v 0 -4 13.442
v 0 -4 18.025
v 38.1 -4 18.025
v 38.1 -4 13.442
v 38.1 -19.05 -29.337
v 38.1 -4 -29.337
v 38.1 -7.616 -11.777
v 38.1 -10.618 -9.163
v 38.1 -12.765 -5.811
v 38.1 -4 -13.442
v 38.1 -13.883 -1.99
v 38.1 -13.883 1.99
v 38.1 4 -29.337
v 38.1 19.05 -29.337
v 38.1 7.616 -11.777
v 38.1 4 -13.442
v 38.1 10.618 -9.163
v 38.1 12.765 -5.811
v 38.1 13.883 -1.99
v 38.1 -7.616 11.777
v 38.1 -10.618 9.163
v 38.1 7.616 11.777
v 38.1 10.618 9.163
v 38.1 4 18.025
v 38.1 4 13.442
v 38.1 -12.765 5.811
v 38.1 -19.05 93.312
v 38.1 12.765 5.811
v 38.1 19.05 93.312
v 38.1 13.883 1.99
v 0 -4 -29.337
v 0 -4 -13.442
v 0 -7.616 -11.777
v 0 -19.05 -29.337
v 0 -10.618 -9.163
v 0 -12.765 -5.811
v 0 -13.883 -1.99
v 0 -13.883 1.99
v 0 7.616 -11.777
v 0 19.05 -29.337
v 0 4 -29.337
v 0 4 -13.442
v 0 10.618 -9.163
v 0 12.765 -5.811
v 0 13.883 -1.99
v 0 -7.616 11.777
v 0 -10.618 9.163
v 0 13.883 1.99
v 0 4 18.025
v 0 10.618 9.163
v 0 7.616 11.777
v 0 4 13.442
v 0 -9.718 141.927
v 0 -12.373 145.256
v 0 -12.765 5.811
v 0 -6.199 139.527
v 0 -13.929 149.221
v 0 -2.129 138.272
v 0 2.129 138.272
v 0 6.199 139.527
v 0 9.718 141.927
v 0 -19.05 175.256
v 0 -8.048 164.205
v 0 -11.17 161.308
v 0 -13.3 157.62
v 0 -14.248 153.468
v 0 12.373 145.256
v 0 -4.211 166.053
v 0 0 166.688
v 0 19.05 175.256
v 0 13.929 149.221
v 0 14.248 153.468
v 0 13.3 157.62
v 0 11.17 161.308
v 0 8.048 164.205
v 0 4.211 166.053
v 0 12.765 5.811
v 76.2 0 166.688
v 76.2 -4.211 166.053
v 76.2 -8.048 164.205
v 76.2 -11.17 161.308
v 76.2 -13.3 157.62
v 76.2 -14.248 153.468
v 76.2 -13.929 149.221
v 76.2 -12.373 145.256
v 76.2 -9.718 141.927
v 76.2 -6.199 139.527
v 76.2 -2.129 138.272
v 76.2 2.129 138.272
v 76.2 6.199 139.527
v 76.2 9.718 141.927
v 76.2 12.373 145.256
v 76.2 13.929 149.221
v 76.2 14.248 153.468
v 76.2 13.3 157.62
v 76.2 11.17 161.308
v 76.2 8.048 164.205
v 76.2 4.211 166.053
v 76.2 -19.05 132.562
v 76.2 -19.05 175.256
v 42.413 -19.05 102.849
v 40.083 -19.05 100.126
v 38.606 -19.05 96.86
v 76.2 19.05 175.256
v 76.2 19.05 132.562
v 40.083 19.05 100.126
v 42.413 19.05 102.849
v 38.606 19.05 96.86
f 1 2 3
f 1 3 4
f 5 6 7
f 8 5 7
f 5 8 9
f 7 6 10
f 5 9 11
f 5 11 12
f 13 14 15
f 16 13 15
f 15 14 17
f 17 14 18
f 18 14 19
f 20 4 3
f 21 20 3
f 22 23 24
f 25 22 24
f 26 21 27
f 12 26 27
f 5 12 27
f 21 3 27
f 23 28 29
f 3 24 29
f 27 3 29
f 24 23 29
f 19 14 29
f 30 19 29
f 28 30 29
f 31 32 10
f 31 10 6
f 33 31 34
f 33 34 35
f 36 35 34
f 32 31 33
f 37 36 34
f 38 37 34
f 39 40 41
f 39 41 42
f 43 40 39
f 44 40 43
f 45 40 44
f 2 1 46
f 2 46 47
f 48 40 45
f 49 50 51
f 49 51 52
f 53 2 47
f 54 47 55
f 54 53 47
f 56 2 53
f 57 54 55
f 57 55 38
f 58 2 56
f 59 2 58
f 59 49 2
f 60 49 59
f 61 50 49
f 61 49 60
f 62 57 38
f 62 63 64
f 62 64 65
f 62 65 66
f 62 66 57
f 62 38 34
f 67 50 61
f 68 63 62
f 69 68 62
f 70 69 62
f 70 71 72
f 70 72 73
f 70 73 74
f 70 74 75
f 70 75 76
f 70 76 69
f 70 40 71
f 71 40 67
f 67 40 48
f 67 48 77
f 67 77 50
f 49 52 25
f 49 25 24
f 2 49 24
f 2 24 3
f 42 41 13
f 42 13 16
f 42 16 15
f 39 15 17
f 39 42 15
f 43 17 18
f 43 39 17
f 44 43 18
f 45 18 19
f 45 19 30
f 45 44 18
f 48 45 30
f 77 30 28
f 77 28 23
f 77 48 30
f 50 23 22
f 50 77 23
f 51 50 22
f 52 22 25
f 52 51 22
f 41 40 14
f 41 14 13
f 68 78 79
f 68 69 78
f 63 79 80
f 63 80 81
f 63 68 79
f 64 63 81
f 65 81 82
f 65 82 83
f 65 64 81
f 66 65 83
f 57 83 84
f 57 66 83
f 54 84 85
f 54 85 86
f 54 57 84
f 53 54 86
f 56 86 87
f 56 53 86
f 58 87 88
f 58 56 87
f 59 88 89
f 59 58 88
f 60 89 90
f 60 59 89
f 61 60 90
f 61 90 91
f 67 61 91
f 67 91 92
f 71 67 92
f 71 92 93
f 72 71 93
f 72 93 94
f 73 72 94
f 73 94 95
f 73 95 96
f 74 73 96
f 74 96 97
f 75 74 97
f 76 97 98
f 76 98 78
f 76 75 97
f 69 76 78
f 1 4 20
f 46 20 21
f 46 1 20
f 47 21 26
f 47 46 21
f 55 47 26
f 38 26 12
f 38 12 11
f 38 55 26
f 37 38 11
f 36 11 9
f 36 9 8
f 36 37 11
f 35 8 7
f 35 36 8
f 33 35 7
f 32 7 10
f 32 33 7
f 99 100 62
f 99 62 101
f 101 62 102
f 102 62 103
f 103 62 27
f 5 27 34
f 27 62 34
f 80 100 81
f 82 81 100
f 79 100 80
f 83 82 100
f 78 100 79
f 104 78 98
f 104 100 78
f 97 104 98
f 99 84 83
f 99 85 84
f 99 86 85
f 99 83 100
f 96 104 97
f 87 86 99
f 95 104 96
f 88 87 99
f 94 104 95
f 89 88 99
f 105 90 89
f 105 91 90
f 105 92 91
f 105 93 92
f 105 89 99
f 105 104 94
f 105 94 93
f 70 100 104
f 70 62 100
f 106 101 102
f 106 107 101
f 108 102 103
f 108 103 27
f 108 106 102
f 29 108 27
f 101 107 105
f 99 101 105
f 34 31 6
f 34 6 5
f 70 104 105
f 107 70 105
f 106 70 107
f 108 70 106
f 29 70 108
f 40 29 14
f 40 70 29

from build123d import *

# Parameters (mm, degrees)
SKETCH1_R           = 14.2875
BOSS_EXTRUDE1_DEPTH = 38.1
SKETCH2_W           = 76.2
SKETCH2_H           = 38.1
SKETCH2_R           = 14.2875
BOSS_EXTRUDE2_DEPTH = 38.1
CUT_EXTRUDE1_DEPTH  = 38.1
FILLET1_R           = 12.7


with BuildPart() as part:
    # Sketch1 → Boss-Extrude1 (new body)
    with BuildSketch(Plane(origin=(0, 0, 0), x_dir=(0, 0, -1), z_dir=(1, 0, 0))):
        with BuildLine():
            Line((29.337186502, -19.05), (-175.255687154, -19.05))
            Line((-175.255687154, -19.05), (-175.255687154, 19.05))
            Line((-175.255687154, 19.05), (29.337186502, 19.05))
            Line((29.337186502, 19.05), (29.337186502, 4))
            Line((29.337186502, 4), (13.442493258, 4))
            ThreePointArc((13.442493258, 4), (0, 14.025), (-13.442493258, 4))
            Line((-13.442493258, 4), (-18.025, 4))
            Line((-18.025, 4), (-18.025, -4))
            Line((-18.025, -4), (-13.442493258, -4))
            ThreePointArc((-13.442493258, -4), (0, -14.025), (13.442493258, -4))
            Line((13.442493258, -4), (29.337186502, -4))
            Line((29.337186502, -4), (29.337186502, -19.05))
        make_face()
        with Locations(Location((-152.4, 0, 0), (0, 0, 180))):
            Circle(SKETCH1_R, mode=Mode.SUBTRACT)
    extrude(amount=BOSS_EXTRUDE1_DEPTH)

    # Sketch2 → Boss-Extrude2 (add)
    with BuildSketch(Plane(origin=(38.1, 0, 0), x_dir=(0, 0, -1), z_dir=(1, 0, 0))):
        with Locations((-137.155687154, 0)):
            Rectangle(SKETCH2_W, SKETCH2_H)
        with Locations(Location((-152.4, 0, 0), (0, 0, 180))):
            Circle(SKETCH2_R, mode=Mode.SUBTRACT)
    extrude(amount=BOSS_EXTRUDE2_DEPTH)

    # Sketch3 → Cut-Extrude1 (cut)
    with BuildSketch(Plane(origin=(0, 19.05, 0), x_dir=(1, 0, 0), z_dir=(0, 1, 0))):
        Polygon((38.1, -99.055687154), (76.2, -132.562404594), (94.277321555, -84.449227978), align=None)
    extrude(amount=-CUT_EXTRUDE1_DEPTH, mode=Mode.SUBTRACT)

    # Fillet1
    fillet1_edges = [part.edges().sort_by_distance(p)[0] for p in [
        (38.1, 0, 99.055687154),
    ]]
    fillet(fillet1_edges, radius=FILLET1_R)


solid = part.part
